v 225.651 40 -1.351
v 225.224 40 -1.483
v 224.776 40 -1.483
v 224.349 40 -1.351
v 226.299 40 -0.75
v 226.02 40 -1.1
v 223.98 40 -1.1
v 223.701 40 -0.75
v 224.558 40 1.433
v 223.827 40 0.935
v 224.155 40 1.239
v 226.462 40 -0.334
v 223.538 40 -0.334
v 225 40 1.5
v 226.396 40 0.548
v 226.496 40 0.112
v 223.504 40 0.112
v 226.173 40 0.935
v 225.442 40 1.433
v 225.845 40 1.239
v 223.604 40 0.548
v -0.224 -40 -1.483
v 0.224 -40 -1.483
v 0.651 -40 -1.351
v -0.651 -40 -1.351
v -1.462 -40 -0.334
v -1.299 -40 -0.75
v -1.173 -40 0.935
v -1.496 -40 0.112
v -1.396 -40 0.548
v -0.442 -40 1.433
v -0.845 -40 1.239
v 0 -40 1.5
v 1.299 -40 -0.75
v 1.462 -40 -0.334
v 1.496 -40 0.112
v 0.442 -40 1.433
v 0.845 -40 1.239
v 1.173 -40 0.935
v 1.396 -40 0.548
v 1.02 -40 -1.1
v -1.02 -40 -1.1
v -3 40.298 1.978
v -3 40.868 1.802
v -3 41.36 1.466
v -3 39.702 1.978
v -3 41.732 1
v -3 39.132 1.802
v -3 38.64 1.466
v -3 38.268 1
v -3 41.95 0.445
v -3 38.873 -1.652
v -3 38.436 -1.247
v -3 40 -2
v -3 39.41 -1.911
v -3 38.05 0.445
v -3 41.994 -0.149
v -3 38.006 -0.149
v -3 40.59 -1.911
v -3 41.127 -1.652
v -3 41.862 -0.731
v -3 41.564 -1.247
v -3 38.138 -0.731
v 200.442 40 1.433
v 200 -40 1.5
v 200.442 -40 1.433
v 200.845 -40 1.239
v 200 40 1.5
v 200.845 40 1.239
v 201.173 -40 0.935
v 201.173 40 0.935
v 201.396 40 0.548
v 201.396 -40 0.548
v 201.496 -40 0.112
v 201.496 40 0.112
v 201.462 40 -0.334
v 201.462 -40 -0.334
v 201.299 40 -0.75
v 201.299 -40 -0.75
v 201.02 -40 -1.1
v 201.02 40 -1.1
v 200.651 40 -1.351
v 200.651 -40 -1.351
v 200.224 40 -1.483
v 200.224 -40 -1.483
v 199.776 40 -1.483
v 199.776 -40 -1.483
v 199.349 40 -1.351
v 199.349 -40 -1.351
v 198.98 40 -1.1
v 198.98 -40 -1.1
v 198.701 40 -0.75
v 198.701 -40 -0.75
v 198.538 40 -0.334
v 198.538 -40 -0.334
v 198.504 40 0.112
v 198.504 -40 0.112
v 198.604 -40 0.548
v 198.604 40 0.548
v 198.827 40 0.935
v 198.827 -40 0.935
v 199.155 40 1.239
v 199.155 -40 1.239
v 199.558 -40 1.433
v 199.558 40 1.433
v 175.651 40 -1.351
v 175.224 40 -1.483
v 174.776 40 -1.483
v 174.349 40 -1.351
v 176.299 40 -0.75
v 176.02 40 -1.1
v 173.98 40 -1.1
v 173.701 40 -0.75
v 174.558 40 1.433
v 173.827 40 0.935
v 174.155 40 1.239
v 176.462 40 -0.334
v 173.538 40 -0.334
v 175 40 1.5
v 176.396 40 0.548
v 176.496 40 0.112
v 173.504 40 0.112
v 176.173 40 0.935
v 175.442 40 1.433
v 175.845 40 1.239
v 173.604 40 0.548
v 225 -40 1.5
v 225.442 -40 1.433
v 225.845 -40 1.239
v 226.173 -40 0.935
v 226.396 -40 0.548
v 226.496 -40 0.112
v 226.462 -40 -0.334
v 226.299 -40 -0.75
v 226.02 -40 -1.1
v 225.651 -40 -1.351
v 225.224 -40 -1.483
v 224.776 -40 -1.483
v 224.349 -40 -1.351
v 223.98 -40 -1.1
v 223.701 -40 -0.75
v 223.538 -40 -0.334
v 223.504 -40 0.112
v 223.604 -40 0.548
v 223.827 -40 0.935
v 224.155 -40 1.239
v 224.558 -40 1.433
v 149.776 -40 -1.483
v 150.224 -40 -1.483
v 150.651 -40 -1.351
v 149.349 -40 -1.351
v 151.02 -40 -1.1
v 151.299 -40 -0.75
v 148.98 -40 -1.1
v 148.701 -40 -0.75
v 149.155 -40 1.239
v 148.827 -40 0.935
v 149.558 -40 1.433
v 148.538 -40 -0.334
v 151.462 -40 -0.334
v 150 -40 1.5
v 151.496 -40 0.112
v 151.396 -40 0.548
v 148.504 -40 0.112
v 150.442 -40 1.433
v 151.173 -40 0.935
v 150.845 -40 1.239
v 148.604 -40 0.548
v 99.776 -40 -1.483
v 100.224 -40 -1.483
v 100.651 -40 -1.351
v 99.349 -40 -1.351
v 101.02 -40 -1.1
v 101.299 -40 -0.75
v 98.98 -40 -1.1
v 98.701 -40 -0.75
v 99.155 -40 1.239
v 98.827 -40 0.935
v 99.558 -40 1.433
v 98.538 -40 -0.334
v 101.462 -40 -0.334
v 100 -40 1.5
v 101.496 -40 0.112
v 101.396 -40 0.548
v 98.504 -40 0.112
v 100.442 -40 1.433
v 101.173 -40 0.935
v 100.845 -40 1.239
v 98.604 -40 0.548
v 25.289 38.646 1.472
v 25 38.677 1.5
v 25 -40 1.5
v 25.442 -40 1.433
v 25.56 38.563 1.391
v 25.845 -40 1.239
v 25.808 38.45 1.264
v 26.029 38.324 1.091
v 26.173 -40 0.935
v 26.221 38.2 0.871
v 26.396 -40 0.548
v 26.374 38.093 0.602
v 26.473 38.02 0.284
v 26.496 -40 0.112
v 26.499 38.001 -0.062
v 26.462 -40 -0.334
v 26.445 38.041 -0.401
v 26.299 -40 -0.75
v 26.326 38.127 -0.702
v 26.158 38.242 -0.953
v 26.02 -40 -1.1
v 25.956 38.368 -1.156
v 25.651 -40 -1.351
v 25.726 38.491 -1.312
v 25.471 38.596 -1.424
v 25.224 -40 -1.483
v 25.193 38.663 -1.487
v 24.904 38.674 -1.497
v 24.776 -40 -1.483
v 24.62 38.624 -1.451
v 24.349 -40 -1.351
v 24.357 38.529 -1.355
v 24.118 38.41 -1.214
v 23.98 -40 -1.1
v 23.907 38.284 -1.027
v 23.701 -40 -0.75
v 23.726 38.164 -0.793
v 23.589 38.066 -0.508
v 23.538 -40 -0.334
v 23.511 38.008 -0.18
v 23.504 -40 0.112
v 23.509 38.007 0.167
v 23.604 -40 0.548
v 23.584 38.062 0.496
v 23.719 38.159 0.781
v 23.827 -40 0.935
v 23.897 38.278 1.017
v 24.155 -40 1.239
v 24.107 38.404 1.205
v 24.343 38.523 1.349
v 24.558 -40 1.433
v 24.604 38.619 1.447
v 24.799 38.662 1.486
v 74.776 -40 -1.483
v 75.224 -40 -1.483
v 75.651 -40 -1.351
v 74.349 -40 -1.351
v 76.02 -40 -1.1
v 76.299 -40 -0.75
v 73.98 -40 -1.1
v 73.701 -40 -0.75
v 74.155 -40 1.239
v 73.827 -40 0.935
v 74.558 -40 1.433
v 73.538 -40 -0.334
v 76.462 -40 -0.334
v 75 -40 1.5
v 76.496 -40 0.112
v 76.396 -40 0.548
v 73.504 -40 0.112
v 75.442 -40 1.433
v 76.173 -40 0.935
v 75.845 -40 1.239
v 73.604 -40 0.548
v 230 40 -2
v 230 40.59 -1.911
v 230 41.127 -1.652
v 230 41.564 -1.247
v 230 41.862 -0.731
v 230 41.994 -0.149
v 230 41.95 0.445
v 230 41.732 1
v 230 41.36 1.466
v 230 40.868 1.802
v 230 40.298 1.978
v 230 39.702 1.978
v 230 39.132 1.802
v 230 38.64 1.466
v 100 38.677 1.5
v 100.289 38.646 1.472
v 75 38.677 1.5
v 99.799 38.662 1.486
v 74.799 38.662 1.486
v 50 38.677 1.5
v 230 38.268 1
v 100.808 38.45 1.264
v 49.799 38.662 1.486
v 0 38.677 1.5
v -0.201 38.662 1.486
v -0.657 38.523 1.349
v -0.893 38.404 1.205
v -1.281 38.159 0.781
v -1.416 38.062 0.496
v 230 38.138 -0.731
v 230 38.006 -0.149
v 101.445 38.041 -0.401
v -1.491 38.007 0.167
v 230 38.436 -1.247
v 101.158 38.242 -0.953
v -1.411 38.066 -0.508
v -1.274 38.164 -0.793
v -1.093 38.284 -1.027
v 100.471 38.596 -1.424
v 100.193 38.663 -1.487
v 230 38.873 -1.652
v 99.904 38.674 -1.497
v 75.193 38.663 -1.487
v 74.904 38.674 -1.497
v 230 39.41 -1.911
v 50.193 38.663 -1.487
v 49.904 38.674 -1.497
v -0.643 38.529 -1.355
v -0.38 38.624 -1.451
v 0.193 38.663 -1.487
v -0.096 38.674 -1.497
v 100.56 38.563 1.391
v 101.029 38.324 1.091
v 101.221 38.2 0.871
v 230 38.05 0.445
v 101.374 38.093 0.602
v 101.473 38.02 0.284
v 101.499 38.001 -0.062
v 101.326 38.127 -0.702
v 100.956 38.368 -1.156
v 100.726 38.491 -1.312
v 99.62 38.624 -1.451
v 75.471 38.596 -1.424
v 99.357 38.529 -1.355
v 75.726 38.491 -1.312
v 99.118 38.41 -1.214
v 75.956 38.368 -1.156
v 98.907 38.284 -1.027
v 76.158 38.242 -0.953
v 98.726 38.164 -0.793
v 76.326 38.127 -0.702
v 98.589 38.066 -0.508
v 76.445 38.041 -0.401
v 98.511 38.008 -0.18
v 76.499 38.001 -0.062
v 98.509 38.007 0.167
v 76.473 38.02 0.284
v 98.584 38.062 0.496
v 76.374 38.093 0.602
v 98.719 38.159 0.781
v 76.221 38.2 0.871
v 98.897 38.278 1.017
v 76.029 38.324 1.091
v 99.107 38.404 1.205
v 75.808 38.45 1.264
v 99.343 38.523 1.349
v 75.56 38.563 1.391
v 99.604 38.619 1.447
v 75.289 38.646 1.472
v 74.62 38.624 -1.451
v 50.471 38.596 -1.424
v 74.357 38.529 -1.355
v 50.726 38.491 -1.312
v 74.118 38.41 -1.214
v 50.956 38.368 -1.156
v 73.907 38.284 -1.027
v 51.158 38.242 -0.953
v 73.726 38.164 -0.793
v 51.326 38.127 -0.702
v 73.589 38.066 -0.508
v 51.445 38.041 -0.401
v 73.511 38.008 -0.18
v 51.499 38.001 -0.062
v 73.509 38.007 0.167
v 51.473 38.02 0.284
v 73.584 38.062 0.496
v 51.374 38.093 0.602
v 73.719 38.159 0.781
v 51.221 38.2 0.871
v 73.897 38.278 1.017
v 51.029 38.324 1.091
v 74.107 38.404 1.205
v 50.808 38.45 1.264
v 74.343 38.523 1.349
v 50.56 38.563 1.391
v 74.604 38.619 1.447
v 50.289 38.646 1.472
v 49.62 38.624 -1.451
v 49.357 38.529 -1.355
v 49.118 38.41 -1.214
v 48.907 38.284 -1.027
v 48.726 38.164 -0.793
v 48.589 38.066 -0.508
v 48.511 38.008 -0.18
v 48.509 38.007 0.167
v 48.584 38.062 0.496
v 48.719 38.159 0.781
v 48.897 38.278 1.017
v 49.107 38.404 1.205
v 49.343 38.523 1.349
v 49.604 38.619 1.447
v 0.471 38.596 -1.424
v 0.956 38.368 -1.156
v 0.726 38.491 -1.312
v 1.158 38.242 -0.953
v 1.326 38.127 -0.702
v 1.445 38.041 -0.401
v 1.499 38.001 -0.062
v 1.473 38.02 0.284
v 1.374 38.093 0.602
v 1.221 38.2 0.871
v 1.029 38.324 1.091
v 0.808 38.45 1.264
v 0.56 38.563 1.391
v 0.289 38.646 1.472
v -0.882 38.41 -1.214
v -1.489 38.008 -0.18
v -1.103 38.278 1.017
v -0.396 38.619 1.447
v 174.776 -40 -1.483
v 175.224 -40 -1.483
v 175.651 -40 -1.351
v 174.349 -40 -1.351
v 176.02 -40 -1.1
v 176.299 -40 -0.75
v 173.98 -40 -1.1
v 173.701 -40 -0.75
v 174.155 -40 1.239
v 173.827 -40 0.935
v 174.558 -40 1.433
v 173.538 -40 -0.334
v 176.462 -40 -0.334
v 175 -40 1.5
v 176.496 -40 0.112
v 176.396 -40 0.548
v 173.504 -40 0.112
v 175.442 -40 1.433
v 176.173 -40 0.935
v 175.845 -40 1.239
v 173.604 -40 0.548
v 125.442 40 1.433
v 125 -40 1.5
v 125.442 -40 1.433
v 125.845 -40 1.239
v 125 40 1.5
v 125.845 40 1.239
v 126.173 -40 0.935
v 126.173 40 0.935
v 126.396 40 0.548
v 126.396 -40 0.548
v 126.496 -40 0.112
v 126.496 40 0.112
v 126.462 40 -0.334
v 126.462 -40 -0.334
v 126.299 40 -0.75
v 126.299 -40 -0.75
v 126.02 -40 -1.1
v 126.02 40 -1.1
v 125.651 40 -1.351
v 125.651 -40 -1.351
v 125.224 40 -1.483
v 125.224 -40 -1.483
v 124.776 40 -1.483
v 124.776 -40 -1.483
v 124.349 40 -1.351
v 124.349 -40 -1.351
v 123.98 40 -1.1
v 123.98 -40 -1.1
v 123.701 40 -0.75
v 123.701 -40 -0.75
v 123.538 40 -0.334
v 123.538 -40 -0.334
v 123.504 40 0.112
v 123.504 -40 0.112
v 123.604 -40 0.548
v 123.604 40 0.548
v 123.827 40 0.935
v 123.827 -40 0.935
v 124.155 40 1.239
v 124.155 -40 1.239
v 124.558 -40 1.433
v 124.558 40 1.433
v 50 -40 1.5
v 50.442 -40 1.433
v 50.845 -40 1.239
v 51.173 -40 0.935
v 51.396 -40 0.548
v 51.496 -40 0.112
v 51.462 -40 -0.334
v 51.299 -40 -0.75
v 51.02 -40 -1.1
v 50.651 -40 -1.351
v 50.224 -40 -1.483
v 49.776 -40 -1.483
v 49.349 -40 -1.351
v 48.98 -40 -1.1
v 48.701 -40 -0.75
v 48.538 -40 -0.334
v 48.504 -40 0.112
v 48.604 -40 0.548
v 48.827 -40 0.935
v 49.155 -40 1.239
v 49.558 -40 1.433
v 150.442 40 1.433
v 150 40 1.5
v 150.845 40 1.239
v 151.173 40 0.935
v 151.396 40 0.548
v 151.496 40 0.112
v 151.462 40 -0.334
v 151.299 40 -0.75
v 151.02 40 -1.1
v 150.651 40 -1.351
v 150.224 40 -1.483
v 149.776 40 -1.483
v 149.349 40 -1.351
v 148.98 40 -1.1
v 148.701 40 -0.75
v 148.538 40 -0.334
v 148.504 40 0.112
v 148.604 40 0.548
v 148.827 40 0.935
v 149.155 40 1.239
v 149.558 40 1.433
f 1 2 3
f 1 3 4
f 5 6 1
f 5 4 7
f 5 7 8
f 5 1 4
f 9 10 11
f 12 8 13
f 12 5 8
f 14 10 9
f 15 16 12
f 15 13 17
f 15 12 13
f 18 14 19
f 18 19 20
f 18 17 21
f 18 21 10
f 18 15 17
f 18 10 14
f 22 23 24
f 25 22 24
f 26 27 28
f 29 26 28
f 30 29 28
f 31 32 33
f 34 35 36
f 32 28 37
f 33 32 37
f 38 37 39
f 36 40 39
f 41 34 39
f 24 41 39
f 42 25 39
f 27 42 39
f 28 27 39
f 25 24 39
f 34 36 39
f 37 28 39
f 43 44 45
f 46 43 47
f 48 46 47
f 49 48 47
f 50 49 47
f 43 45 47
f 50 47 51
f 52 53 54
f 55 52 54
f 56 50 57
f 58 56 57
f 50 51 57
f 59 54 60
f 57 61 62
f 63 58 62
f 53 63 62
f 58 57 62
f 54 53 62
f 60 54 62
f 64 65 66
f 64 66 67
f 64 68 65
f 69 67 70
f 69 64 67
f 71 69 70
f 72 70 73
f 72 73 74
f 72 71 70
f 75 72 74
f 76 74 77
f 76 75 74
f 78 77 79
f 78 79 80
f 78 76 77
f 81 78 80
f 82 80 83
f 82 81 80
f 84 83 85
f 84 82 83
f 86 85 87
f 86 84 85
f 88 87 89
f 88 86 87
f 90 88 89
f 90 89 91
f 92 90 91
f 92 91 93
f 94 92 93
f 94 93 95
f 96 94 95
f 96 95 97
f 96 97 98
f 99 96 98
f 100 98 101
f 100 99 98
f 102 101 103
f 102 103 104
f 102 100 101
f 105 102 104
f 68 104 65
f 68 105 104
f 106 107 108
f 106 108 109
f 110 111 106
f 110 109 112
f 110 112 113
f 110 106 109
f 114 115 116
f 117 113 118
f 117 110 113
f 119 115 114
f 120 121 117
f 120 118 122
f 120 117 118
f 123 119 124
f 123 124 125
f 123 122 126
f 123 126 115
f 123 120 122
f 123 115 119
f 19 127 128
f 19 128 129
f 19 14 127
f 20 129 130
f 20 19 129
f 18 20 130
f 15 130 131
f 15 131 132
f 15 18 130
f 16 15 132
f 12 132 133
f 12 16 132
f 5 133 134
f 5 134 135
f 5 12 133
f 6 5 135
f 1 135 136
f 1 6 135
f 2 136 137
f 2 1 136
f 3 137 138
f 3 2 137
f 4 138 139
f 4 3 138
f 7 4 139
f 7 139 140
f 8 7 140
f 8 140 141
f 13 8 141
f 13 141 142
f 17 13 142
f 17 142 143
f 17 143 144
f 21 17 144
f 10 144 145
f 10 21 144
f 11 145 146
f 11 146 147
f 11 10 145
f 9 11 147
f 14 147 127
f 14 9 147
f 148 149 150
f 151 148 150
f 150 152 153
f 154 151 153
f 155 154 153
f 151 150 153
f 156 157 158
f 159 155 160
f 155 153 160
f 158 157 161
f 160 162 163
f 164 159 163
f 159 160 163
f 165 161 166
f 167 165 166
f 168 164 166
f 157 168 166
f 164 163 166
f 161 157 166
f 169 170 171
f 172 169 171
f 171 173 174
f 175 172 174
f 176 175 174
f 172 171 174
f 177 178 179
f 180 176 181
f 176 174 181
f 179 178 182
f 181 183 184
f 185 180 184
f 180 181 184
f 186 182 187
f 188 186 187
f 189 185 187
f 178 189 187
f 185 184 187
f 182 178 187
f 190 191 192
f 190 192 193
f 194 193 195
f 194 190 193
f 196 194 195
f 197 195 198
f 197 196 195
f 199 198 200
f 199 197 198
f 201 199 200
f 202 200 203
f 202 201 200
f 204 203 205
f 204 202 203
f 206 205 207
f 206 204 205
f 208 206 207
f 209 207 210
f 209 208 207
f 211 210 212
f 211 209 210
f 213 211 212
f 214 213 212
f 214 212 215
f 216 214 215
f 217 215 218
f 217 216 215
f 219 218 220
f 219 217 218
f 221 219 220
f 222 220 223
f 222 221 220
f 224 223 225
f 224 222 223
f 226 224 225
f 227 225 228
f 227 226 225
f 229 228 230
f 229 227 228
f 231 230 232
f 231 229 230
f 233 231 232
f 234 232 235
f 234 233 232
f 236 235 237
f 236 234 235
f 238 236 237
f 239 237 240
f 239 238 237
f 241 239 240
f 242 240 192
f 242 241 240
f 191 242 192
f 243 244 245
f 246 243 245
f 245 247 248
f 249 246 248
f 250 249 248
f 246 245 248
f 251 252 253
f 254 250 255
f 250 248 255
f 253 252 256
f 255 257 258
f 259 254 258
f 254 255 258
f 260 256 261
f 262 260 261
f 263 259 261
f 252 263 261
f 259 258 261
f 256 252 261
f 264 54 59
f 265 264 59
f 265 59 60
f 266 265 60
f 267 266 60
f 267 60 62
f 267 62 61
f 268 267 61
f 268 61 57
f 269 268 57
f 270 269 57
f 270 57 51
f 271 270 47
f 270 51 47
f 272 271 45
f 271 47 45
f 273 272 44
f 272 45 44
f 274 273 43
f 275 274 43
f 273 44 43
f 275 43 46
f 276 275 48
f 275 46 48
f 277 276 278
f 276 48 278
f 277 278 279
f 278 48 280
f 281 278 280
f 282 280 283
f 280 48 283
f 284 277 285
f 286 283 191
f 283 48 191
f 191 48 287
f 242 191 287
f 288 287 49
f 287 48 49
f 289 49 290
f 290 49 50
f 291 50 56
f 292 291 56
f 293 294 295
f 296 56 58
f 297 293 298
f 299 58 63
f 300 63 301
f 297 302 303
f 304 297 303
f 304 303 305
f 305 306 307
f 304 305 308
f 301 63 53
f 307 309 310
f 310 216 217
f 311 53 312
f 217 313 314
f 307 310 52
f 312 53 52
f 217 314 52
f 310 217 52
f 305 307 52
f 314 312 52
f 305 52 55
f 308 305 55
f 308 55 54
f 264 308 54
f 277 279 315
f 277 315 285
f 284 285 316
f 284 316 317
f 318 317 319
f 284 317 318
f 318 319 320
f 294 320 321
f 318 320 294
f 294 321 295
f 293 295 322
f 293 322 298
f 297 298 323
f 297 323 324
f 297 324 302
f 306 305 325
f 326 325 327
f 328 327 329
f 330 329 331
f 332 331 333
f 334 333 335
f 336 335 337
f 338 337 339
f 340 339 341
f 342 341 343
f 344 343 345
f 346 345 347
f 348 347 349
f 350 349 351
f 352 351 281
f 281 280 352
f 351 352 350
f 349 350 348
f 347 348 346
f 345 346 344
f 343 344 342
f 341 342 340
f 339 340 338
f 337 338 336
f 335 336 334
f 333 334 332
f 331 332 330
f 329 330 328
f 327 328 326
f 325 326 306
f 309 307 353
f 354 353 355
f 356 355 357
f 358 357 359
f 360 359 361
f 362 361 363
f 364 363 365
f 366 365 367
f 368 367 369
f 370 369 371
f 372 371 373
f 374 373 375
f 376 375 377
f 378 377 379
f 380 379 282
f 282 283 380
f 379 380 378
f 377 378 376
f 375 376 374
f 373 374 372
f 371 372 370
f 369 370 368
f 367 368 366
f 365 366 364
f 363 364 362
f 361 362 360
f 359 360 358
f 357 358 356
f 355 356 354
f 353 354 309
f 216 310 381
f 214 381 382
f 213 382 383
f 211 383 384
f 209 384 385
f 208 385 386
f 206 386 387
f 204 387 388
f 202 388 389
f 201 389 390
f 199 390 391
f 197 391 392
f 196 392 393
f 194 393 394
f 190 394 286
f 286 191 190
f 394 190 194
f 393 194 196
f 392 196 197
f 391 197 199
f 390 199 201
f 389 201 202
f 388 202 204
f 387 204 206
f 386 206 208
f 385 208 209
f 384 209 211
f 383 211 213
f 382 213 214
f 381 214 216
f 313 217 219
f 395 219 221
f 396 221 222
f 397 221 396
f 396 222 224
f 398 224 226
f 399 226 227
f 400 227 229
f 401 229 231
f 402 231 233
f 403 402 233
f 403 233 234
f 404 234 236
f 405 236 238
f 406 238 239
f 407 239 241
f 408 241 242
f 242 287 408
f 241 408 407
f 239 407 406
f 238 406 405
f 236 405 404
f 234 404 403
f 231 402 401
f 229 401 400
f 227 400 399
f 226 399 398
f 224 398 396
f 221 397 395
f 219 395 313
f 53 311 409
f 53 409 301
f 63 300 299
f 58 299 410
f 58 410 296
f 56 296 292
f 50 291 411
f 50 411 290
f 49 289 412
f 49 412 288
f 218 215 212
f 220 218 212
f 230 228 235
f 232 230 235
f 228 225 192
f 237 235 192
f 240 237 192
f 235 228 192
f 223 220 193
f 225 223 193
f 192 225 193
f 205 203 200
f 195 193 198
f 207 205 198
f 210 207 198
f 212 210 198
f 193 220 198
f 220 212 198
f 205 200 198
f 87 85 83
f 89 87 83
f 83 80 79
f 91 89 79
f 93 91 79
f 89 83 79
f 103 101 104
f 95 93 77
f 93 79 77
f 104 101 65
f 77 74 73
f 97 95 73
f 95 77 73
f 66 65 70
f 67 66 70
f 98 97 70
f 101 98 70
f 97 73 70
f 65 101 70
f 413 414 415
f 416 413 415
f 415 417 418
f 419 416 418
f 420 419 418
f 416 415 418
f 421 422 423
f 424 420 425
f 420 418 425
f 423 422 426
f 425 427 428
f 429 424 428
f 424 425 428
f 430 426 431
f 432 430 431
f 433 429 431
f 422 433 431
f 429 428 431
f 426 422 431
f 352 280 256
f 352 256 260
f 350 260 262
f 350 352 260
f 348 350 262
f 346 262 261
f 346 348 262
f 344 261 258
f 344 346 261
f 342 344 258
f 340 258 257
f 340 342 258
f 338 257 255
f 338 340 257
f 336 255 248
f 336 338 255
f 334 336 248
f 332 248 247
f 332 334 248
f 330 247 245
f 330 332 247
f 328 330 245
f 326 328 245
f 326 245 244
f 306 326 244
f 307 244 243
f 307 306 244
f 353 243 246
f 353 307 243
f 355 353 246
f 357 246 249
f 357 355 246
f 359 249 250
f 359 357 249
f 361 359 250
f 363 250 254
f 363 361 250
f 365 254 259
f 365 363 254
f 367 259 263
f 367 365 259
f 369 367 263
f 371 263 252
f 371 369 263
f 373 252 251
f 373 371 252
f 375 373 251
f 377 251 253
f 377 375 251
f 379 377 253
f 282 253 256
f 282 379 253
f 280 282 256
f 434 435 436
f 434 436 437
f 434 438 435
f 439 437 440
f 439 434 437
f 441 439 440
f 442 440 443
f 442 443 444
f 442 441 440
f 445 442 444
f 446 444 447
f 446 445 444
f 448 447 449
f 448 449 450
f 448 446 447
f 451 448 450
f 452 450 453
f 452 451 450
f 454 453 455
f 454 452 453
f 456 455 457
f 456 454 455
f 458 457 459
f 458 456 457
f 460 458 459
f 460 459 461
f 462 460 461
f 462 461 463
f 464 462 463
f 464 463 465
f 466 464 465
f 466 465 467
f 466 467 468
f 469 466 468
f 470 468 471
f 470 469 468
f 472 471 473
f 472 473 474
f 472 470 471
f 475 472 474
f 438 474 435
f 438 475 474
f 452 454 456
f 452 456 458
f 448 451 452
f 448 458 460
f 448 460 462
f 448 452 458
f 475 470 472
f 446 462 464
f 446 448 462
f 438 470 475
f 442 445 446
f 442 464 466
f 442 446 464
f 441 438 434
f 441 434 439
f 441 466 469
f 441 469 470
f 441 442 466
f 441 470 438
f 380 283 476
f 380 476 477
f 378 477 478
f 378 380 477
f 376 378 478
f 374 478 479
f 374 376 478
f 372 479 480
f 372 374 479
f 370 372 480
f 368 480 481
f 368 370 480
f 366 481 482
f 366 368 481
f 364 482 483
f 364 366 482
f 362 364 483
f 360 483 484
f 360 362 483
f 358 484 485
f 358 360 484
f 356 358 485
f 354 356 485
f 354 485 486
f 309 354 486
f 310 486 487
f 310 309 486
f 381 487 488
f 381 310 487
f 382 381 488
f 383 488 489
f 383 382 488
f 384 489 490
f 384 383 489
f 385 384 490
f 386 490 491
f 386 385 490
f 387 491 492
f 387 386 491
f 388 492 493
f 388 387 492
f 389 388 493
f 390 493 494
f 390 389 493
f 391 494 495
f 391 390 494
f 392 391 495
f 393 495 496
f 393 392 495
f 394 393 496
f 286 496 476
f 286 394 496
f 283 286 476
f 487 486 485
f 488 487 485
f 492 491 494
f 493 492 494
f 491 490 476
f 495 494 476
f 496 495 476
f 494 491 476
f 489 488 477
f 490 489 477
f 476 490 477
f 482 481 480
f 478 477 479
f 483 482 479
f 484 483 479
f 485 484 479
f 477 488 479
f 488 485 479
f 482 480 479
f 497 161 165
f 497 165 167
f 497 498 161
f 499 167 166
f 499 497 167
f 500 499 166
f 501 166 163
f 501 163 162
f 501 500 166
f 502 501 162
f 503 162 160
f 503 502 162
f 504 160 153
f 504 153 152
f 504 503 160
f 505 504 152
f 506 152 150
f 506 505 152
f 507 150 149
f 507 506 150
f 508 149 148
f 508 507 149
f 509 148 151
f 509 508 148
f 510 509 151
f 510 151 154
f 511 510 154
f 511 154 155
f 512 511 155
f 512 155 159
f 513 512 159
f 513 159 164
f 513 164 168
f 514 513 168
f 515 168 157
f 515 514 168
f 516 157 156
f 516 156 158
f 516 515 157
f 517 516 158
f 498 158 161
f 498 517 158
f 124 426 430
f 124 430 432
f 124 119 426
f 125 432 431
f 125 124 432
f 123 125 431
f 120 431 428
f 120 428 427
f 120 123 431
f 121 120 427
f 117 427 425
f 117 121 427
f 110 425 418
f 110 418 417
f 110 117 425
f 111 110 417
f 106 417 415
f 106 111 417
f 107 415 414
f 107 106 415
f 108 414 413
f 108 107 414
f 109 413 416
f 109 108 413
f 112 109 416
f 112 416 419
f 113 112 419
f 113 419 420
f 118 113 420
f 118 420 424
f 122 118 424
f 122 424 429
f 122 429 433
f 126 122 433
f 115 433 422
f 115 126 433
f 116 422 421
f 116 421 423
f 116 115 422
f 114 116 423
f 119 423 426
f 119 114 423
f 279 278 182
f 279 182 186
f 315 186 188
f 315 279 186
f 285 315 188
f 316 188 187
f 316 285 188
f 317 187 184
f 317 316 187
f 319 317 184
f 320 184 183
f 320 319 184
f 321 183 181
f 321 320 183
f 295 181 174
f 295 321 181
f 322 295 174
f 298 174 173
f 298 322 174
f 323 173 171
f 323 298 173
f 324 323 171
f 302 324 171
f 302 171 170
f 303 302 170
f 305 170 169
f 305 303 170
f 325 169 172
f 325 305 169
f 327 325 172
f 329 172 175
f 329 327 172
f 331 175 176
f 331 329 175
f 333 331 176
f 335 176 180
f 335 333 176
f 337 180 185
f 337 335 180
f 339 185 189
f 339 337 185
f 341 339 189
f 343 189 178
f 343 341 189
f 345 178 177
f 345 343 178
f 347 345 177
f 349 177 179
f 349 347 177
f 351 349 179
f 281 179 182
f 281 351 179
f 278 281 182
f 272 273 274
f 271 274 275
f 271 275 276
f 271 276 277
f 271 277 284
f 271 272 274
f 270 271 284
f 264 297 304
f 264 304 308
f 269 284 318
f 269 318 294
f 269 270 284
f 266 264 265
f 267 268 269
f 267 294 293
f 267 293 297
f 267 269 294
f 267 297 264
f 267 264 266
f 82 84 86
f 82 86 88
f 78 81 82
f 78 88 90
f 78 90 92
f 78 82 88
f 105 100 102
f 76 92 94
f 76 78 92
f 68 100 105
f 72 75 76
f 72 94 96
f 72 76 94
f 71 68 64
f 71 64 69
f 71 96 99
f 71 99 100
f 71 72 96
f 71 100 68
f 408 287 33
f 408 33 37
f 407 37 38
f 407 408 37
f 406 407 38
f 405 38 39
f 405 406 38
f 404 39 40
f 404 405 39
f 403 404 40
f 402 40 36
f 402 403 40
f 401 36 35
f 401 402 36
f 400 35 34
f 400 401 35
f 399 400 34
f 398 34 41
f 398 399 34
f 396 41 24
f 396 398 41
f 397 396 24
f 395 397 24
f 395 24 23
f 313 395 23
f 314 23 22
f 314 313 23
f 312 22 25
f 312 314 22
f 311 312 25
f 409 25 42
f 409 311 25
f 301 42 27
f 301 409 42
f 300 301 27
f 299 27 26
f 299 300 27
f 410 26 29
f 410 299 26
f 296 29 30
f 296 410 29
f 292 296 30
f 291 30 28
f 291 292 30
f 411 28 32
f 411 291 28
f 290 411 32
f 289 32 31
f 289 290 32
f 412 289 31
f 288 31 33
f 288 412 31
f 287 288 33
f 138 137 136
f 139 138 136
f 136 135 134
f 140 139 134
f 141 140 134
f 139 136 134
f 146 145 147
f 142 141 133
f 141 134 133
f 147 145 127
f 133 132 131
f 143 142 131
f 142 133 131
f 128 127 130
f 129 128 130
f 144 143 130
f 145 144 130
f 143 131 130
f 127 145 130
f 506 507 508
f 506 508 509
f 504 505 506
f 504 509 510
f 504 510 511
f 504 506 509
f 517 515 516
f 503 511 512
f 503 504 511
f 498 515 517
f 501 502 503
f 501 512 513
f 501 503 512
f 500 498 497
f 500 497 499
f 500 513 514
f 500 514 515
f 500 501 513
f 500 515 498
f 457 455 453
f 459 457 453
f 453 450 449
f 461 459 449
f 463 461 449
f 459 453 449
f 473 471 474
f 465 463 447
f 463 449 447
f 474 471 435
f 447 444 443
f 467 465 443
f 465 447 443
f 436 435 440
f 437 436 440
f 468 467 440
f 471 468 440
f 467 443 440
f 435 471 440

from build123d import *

# Parameters (mm, degrees)
SKETCH1_R                 = 1.5
VERTICAL_BARS_DEPTH       = 40
VERTICAL_BARS_2_DEPTH     = 40
VERTICAL_BARS_3_DEPTH     = 40
VERTICAL_BARS_4_DEPTH     = 40
VERTICAL_BARS_5_DEPTH     = 40
VERTICAL_BARS_6_DEPTH     = 40
VERTICAL_BARS_7_DEPTH     = 40
VERTICAL_BARS_8_DEPTH     = 40
VERTICAL_BARS_9_DEPTH     = 40
VERTICAL_BARS_10_DEPTH    = 40
HORIZONTAL_BAR_DEPTH      = 230
HORIZONTAL_BAR_DEPTH_BACK = 3
SKETCH2_R                 = 2


with BuildPart() as part:
    # Sketch1 → Vertical Bars (new, symmetric)
    with BuildSketch(Plane(origin=(0, 0, 0), x_dir=(1, 0, 0), z_dir=(0, 1, 0))):
        with Locations(Location((0, 0, 0), (0, 0, 270))):
            Circle(SKETCH1_R)
    extrude(amount=VERTICAL_BARS_DEPTH, both=True)



with BuildPart() as body_2:
    # Sketch1 → Vertical Bars 2 (new, symmetric)
    with BuildSketch(Plane(origin=(0, 0, 0), x_dir=(1, 0, 0), z_dir=(0, 1, 0))):
        with Locations(Location((25, 0, 0), (0, 0, 270))):
            Circle(SKETCH1_R)
    extrude(amount=VERTICAL_BARS_2_DEPTH, both=True)


with BuildPart() as body_3:
    # Sketch1 → Vertical Bars 3 (new, symmetric)
    with BuildSketch(Plane(origin=(0, 0, 0), x_dir=(1, 0, 0), z_dir=(0, 1, 0))):
        with Locations(Location((50, 0, 0), (0, 0, 270))):
            Circle(SKETCH1_R)
    extrude(amount=VERTICAL_BARS_3_DEPTH, both=True)


with BuildPart() as body_4:
    # Sketch1 → Vertical Bars 4 (new, symmetric)
    with BuildSketch(Plane(origin=(0, 0, 0), x_dir=(1, 0, 0), z_dir=(0, 1, 0))):
        with Locations(Location((75, 0, 0), (0, 0, 270))):
            Circle(SKETCH1_R)
    extrude(amount=VERTICAL_BARS_4_DEPTH, both=True)


with BuildPart() as body_5:
    # Sketch1 → Vertical Bars 5 (new, symmetric)
    with BuildSketch(Plane(origin=(0, 0, 0), x_dir=(1, 0, 0), z_dir=(0, 1, 0))):
        with Locations(Location((100, 0, 0), (0, 0, 270))):
            Circle(SKETCH1_R)
    extrude(amount=VERTICAL_BARS_5_DEPTH, both=True)


with BuildPart() as body_6:
    # Sketch1 → Vertical Bars 6 (new, symmetric)
    with BuildSketch(Plane(origin=(0, 0, 0), x_dir=(1, 0, 0), z_dir=(0, 1, 0))):
        with Locations(Location((125, 0, 0), (0, 0, 270))):
            Circle(SKETCH1_R)
    extrude(amount=VERTICAL_BARS_6_DEPTH, both=True)


with BuildPart() as body_7:
    # Sketch1 → Vertical Bars 7 (new, symmetric)
    with BuildSketch(Plane(origin=(0, 0, 0), x_dir=(1, 0, 0), z_dir=(0, 1, 0))):
        with Locations(Location((150, 0, 0), (0, 0, 270))):
            Circle(SKETCH1_R)
    extrude(amount=VERTICAL_BARS_7_DEPTH, both=True)


with BuildPart() as body_8:
    # Sketch1 → Vertical Bars 8 (new, symmetric)
    with BuildSketch(Plane(origin=(0, 0, 0), x_dir=(1, 0, 0), z_dir=(0, 1, 0))):
        with Locations(Location((175, 0, 0), (0, 0, 270))):
            Circle(SKETCH1_R)
    extrude(amount=VERTICAL_BARS_8_DEPTH, both=True)


with BuildPart() as body_9:
    # Sketch1 → Vertical Bars 9 (new, symmetric)
    with BuildSketch(Plane(origin=(0, 0, 0), x_dir=(1, 0, 0), z_dir=(0, 1, 0))):
        with Locations(Location((200, 0, 0), (0, 0, 270))):
            Circle(SKETCH1_R)
    extrude(amount=VERTICAL_BARS_9_DEPTH, both=True)


with BuildPart() as body_10:
    # Sketch1 → Vertical Bars 10 (new, symmetric)
    with BuildSketch(Plane(origin=(0, 0, 0), x_dir=(1, 0, 0), z_dir=(0, 1, 0))):
        with Locations(Location((225, 0, 0), (0, 0, 270))):
            Circle(SKETCH1_R)
    extrude(amount=VERTICAL_BARS_10_DEPTH, both=True)


with BuildPart() as part_1:
    add(part.part)

    add(body_2.part)  # Horizontal Bar merges body 2

    add(body_3.part)  # Horizontal Bar merges body 3

    add(body_4.part)  # Horizontal Bar merges body 4

    add(body_5.part)  # Horizontal Bar merges body 5
    # Sketch2 → Horizontal Bar (add, two sides: drawn at the far end of the back side and taken through both)
    with BuildSketch(Plane(origin=(0, 0, 0), x_dir=(0, 0, -1), z_dir=(1, 0, 0)).offset(-HORIZONTAL_BAR_DEPTH_BACK)):
        with Locations((0, 40)):
            Circle(SKETCH2_R)
    extrude(amount=HORIZONTAL_BAR_DEPTH + HORIZONTAL_BAR_DEPTH_BACK)


solid = Compound([body_6.part, body_7.part, body_8.part, body_9.part, body_10.part, part_1.part])
